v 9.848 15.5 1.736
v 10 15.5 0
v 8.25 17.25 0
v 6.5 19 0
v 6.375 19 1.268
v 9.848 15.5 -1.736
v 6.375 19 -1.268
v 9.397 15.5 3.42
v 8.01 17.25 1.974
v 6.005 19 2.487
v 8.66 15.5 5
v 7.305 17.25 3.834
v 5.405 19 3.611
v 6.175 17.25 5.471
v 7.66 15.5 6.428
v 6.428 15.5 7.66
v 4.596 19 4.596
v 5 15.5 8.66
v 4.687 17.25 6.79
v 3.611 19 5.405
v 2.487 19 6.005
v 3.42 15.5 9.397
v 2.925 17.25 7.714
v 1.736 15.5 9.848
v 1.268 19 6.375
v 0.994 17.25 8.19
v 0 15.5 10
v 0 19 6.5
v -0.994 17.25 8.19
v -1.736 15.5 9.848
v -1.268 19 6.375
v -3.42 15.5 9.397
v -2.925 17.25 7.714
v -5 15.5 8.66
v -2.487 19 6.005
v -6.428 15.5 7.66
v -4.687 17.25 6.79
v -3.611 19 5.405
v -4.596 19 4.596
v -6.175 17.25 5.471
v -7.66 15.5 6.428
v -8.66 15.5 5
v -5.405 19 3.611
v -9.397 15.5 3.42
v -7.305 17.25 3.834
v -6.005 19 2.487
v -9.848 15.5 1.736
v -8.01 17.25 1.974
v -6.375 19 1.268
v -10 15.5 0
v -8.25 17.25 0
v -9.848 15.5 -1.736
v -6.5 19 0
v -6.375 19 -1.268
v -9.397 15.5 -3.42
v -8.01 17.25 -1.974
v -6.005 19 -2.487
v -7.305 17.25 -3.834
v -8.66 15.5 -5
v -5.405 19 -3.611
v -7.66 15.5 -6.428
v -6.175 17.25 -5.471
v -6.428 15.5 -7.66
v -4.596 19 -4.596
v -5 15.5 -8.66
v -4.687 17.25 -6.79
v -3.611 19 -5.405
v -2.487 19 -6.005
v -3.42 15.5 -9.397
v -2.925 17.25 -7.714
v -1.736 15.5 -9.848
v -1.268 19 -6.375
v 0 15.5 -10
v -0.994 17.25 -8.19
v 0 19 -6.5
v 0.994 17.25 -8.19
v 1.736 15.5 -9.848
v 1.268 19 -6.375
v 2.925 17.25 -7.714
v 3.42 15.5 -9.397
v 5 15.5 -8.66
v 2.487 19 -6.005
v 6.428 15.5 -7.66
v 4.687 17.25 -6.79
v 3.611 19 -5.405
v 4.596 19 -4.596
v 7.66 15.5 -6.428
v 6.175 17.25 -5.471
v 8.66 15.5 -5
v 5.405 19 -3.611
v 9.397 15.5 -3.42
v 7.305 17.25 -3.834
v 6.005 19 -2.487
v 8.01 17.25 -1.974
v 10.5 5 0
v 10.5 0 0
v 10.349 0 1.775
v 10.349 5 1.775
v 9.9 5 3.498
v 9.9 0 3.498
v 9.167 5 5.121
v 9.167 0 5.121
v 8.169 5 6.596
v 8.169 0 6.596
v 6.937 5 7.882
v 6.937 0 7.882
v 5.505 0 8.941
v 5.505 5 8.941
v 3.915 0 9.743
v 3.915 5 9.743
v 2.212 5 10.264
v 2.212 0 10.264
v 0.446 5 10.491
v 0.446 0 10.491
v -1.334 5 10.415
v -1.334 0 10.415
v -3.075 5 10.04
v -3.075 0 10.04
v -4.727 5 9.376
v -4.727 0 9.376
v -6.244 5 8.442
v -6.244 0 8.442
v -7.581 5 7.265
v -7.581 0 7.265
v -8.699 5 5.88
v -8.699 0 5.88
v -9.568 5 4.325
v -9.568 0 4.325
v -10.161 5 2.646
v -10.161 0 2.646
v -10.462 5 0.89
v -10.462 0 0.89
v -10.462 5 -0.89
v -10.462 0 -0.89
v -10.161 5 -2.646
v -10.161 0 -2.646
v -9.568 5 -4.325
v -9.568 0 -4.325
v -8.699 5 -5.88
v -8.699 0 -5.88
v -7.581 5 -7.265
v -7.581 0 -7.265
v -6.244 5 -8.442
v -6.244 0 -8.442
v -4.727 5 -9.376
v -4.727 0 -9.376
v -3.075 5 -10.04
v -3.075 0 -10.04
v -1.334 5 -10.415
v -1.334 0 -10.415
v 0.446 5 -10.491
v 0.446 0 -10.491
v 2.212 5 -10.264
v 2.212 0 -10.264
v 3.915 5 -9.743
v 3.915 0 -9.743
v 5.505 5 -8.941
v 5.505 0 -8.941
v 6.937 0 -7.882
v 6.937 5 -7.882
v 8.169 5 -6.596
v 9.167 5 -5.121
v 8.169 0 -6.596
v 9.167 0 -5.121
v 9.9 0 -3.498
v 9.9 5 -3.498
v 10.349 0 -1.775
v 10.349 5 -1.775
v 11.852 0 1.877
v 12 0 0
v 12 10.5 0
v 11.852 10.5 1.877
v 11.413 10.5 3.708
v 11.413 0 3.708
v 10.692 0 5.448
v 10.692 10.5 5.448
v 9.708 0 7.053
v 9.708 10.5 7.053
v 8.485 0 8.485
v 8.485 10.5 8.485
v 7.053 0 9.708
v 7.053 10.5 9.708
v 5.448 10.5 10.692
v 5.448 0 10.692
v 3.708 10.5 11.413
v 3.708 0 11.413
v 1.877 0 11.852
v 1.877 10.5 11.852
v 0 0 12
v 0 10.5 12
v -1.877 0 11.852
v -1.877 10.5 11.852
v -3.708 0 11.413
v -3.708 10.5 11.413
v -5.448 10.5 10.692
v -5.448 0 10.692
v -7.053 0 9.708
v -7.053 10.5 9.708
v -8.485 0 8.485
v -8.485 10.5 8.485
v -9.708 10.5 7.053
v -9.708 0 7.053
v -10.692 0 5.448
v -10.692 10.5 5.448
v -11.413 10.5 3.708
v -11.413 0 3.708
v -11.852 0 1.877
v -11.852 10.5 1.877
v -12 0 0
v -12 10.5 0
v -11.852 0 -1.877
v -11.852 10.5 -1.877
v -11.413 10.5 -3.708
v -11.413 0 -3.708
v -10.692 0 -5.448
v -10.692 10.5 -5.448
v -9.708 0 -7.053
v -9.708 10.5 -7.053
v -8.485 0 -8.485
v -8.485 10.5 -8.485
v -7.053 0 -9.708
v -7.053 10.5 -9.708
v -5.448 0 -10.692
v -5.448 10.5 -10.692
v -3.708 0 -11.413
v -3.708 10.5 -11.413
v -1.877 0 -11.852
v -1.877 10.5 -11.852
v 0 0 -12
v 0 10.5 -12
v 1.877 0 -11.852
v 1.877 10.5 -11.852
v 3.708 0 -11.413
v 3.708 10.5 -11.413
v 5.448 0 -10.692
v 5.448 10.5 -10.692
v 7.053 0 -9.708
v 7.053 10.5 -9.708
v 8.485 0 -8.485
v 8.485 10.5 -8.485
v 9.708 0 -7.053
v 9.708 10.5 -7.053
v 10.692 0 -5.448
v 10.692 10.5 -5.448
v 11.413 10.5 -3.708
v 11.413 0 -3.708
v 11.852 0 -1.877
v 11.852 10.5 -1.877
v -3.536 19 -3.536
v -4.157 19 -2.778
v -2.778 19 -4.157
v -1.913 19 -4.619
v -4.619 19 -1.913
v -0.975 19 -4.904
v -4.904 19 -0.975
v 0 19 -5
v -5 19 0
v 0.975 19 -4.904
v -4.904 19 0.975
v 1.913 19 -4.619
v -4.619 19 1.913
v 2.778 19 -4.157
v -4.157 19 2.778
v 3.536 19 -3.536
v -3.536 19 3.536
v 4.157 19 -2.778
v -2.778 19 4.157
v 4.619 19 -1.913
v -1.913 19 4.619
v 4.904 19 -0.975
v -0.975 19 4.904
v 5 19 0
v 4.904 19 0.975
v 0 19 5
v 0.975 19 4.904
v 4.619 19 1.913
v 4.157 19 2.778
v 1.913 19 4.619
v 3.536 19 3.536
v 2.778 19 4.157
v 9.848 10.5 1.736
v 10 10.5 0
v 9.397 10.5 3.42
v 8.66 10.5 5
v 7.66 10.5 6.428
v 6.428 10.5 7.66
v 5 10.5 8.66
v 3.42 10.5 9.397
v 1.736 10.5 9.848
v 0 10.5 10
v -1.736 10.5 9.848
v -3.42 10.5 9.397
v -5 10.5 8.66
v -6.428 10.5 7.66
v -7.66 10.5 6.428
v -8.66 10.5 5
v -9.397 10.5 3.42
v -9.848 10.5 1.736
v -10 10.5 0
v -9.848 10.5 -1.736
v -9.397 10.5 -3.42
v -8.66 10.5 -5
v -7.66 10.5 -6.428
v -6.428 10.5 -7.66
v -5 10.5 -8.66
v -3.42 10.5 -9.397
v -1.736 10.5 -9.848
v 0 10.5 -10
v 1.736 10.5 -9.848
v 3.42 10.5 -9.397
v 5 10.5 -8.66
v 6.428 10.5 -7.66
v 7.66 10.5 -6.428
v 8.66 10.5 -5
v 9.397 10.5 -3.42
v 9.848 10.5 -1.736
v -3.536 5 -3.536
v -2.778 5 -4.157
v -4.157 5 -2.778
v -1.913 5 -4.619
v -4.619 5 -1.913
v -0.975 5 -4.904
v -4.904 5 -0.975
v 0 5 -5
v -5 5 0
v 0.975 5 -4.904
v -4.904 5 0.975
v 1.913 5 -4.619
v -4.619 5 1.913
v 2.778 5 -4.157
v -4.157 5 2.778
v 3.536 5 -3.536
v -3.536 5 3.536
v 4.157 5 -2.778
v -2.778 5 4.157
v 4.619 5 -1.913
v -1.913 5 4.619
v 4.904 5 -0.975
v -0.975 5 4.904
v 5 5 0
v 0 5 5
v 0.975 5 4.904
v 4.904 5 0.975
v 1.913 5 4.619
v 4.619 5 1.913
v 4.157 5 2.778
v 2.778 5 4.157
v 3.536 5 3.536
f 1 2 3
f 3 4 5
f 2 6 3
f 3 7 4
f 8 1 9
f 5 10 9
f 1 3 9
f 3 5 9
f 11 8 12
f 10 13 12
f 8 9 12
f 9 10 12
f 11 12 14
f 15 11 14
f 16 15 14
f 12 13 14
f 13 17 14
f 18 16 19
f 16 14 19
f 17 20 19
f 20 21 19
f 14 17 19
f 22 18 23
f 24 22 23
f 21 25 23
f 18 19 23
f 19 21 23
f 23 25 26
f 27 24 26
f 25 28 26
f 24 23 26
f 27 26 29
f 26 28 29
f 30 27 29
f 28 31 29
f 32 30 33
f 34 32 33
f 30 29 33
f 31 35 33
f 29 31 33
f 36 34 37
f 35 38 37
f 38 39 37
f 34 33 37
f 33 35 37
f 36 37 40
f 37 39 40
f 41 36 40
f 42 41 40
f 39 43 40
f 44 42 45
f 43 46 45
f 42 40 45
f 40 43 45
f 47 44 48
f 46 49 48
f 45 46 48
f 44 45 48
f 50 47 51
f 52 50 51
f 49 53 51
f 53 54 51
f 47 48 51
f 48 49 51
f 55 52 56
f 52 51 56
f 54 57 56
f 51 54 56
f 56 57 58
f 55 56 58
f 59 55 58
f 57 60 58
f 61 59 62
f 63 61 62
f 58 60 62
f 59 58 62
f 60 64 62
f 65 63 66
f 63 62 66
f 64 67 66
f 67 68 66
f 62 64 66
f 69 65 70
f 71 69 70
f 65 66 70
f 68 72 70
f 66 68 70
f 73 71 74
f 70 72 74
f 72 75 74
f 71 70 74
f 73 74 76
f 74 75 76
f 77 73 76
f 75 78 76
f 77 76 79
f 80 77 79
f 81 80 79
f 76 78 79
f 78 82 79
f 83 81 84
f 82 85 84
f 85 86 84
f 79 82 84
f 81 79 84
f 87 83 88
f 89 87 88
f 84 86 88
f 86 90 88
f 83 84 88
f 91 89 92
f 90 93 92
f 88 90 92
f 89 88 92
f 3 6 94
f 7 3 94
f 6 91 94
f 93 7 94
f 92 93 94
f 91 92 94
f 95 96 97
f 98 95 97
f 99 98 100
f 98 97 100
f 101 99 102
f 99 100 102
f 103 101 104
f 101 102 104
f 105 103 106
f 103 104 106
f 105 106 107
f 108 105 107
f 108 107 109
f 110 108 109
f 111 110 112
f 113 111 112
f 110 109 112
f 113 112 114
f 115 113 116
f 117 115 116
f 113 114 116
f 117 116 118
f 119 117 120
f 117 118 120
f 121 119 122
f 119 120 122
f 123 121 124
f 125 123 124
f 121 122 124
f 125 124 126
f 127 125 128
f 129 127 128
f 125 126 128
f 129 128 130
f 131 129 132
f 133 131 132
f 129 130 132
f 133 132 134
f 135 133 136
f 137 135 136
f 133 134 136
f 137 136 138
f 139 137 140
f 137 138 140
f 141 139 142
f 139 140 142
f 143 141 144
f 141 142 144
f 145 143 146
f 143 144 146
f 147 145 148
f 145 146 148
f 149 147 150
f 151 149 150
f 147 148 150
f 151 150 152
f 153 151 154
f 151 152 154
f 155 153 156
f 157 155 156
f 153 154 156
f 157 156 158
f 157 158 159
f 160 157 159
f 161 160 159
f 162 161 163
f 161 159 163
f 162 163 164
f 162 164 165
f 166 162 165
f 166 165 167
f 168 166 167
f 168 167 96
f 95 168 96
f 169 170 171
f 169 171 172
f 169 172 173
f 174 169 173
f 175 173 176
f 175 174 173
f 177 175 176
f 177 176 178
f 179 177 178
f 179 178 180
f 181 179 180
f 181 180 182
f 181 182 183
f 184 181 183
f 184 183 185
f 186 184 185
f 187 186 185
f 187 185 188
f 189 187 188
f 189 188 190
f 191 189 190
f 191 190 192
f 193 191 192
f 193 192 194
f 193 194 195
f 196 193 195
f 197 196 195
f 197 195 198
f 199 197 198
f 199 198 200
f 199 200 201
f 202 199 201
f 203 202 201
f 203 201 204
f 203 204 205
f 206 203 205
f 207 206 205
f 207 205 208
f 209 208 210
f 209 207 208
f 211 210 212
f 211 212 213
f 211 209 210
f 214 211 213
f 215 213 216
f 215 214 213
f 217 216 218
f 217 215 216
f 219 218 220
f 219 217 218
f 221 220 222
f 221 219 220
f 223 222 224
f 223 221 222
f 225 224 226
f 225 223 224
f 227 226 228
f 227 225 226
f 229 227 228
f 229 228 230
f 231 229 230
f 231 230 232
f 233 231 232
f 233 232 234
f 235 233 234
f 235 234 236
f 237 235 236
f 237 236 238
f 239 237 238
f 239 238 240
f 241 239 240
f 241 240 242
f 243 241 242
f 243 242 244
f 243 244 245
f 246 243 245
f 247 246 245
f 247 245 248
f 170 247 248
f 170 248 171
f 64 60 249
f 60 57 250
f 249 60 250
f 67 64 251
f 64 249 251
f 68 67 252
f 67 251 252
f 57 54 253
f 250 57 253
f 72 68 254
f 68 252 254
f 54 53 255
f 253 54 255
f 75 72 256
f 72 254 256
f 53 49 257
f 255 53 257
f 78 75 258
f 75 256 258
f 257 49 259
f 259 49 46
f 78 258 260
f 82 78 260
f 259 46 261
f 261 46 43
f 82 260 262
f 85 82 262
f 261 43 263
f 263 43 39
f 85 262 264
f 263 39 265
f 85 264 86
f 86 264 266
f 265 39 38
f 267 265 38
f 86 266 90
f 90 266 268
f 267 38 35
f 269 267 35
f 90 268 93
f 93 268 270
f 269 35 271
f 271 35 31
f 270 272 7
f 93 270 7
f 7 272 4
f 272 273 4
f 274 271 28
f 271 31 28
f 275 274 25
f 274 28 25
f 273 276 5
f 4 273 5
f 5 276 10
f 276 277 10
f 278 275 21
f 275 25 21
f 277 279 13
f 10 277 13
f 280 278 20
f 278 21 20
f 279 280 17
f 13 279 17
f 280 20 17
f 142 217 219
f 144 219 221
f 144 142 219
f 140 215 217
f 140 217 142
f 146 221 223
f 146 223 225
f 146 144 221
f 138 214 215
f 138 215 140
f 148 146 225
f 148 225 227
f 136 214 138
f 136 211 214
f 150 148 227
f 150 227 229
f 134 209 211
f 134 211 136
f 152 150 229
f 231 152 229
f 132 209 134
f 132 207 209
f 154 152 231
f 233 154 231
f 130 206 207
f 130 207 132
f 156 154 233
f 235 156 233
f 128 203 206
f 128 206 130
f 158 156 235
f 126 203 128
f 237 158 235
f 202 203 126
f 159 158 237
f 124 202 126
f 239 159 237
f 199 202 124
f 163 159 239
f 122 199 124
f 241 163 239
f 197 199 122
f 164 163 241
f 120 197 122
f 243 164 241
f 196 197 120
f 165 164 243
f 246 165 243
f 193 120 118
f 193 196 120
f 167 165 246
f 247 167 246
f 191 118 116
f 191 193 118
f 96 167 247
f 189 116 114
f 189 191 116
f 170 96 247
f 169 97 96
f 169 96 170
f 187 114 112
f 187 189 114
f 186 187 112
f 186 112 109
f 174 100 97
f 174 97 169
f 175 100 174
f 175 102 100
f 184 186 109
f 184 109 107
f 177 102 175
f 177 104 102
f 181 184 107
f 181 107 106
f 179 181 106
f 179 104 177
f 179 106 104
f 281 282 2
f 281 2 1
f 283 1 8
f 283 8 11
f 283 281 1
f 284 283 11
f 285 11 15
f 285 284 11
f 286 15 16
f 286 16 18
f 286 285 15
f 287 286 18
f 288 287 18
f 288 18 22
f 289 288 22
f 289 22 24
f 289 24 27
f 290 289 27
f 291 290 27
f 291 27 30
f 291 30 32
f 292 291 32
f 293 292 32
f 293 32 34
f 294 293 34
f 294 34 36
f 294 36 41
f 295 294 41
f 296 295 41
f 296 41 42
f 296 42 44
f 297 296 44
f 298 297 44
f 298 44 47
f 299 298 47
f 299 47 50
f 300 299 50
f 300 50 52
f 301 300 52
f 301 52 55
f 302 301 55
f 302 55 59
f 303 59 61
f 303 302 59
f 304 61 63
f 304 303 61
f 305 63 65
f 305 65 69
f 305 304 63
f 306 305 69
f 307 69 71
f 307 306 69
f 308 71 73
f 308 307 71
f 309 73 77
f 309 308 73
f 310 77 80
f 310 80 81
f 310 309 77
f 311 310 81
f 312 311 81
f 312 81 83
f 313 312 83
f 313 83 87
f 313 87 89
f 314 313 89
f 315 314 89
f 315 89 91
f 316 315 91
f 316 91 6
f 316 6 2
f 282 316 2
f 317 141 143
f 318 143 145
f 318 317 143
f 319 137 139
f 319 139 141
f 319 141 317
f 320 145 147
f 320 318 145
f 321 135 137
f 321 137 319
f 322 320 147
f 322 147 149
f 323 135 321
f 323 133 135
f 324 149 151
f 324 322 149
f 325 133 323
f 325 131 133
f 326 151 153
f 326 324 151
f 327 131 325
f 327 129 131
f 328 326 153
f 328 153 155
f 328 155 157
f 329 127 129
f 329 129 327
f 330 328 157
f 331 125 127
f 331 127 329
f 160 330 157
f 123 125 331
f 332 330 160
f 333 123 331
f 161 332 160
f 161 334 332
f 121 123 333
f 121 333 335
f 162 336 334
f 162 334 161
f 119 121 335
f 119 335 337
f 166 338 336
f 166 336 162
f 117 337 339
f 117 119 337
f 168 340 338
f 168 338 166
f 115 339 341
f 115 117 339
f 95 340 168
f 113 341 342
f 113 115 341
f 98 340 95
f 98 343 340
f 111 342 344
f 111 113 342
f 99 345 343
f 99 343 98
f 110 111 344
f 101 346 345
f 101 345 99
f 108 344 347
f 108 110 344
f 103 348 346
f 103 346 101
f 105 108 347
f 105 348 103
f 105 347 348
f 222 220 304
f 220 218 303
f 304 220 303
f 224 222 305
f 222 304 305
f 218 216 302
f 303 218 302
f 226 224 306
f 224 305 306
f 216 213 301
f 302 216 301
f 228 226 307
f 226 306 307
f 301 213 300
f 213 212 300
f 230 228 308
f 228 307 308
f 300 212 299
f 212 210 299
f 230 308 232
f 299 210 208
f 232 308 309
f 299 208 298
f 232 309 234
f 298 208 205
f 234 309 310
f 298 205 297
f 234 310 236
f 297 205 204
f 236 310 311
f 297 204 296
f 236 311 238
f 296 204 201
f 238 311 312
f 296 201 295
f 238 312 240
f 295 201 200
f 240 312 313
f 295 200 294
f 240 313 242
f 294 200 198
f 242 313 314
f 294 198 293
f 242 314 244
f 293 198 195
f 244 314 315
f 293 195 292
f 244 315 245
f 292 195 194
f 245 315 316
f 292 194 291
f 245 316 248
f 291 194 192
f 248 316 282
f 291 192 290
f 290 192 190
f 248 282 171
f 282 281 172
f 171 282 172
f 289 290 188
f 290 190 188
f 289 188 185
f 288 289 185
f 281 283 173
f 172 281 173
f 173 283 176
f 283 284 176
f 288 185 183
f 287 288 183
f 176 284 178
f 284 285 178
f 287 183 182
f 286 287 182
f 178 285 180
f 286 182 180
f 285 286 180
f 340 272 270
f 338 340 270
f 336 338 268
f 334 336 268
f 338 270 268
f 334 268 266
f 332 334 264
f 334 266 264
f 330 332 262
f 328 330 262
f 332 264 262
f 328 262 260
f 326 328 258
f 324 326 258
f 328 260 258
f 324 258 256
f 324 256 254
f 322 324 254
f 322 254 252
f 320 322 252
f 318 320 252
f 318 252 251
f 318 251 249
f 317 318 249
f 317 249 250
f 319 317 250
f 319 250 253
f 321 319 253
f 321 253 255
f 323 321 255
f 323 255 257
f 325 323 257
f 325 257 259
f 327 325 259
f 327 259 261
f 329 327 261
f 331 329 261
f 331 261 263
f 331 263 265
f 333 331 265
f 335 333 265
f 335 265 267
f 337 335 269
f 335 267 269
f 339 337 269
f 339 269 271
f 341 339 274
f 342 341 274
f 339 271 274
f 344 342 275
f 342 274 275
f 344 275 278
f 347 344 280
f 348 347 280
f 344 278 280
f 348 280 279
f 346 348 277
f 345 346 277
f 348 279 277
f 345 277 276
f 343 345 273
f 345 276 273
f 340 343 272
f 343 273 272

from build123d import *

# Parameters (mm, degrees)
F0_R     = 12
F1_DEPTH = 19
F3_R     = 12
F3_R_2   = 10
F4_DEPTH = 13
F6_R     = 5
F7_DEPTH = 25
F8_R     = 10.5
F9_DEPTH = 5
F10_SIZE = 3.5


with BuildPart() as f1:
    # F0 (on Front) → F1 (new body)
    with BuildSketch(Plane.XZ):
        Circle(F0_R)
    extrude(amount=-F1_DEPTH)

    # F3 (on offset) → F4 (cut)
    with BuildSketch(Plane.XZ.offset(-10.5)):
        Circle(F3_R)
        Circle(F3_R_2, mode=Mode.SUBTRACT)
    extrude(amount=-F4_DEPTH, mode=Mode.SUBTRACT)

    # F6 (on offset) → F7 (cut)
    with BuildSketch(Plane(origin=(0, 19, 0), x_dir=(1, 0, 0), z_dir=(0, 1, 0))):
        Circle(F6_R)
    extrude(amount=-F7_DEPTH, mode=Mode.SUBTRACT)

    # F8 (on Front) → F9 (cut)
    with BuildSketch(Plane.XZ):
        Circle(F8_R)
    extrude(amount=-F9_DEPTH, mode=Mode.SUBTRACT)

    # F10
    f10_edges = [f1.edges().sort_by_distance(p)[0] for p in [
        (-10, 19, 0),
    ]]
    chamfer(f10_edges, length=F10_SIZE)


solid = f1.part
